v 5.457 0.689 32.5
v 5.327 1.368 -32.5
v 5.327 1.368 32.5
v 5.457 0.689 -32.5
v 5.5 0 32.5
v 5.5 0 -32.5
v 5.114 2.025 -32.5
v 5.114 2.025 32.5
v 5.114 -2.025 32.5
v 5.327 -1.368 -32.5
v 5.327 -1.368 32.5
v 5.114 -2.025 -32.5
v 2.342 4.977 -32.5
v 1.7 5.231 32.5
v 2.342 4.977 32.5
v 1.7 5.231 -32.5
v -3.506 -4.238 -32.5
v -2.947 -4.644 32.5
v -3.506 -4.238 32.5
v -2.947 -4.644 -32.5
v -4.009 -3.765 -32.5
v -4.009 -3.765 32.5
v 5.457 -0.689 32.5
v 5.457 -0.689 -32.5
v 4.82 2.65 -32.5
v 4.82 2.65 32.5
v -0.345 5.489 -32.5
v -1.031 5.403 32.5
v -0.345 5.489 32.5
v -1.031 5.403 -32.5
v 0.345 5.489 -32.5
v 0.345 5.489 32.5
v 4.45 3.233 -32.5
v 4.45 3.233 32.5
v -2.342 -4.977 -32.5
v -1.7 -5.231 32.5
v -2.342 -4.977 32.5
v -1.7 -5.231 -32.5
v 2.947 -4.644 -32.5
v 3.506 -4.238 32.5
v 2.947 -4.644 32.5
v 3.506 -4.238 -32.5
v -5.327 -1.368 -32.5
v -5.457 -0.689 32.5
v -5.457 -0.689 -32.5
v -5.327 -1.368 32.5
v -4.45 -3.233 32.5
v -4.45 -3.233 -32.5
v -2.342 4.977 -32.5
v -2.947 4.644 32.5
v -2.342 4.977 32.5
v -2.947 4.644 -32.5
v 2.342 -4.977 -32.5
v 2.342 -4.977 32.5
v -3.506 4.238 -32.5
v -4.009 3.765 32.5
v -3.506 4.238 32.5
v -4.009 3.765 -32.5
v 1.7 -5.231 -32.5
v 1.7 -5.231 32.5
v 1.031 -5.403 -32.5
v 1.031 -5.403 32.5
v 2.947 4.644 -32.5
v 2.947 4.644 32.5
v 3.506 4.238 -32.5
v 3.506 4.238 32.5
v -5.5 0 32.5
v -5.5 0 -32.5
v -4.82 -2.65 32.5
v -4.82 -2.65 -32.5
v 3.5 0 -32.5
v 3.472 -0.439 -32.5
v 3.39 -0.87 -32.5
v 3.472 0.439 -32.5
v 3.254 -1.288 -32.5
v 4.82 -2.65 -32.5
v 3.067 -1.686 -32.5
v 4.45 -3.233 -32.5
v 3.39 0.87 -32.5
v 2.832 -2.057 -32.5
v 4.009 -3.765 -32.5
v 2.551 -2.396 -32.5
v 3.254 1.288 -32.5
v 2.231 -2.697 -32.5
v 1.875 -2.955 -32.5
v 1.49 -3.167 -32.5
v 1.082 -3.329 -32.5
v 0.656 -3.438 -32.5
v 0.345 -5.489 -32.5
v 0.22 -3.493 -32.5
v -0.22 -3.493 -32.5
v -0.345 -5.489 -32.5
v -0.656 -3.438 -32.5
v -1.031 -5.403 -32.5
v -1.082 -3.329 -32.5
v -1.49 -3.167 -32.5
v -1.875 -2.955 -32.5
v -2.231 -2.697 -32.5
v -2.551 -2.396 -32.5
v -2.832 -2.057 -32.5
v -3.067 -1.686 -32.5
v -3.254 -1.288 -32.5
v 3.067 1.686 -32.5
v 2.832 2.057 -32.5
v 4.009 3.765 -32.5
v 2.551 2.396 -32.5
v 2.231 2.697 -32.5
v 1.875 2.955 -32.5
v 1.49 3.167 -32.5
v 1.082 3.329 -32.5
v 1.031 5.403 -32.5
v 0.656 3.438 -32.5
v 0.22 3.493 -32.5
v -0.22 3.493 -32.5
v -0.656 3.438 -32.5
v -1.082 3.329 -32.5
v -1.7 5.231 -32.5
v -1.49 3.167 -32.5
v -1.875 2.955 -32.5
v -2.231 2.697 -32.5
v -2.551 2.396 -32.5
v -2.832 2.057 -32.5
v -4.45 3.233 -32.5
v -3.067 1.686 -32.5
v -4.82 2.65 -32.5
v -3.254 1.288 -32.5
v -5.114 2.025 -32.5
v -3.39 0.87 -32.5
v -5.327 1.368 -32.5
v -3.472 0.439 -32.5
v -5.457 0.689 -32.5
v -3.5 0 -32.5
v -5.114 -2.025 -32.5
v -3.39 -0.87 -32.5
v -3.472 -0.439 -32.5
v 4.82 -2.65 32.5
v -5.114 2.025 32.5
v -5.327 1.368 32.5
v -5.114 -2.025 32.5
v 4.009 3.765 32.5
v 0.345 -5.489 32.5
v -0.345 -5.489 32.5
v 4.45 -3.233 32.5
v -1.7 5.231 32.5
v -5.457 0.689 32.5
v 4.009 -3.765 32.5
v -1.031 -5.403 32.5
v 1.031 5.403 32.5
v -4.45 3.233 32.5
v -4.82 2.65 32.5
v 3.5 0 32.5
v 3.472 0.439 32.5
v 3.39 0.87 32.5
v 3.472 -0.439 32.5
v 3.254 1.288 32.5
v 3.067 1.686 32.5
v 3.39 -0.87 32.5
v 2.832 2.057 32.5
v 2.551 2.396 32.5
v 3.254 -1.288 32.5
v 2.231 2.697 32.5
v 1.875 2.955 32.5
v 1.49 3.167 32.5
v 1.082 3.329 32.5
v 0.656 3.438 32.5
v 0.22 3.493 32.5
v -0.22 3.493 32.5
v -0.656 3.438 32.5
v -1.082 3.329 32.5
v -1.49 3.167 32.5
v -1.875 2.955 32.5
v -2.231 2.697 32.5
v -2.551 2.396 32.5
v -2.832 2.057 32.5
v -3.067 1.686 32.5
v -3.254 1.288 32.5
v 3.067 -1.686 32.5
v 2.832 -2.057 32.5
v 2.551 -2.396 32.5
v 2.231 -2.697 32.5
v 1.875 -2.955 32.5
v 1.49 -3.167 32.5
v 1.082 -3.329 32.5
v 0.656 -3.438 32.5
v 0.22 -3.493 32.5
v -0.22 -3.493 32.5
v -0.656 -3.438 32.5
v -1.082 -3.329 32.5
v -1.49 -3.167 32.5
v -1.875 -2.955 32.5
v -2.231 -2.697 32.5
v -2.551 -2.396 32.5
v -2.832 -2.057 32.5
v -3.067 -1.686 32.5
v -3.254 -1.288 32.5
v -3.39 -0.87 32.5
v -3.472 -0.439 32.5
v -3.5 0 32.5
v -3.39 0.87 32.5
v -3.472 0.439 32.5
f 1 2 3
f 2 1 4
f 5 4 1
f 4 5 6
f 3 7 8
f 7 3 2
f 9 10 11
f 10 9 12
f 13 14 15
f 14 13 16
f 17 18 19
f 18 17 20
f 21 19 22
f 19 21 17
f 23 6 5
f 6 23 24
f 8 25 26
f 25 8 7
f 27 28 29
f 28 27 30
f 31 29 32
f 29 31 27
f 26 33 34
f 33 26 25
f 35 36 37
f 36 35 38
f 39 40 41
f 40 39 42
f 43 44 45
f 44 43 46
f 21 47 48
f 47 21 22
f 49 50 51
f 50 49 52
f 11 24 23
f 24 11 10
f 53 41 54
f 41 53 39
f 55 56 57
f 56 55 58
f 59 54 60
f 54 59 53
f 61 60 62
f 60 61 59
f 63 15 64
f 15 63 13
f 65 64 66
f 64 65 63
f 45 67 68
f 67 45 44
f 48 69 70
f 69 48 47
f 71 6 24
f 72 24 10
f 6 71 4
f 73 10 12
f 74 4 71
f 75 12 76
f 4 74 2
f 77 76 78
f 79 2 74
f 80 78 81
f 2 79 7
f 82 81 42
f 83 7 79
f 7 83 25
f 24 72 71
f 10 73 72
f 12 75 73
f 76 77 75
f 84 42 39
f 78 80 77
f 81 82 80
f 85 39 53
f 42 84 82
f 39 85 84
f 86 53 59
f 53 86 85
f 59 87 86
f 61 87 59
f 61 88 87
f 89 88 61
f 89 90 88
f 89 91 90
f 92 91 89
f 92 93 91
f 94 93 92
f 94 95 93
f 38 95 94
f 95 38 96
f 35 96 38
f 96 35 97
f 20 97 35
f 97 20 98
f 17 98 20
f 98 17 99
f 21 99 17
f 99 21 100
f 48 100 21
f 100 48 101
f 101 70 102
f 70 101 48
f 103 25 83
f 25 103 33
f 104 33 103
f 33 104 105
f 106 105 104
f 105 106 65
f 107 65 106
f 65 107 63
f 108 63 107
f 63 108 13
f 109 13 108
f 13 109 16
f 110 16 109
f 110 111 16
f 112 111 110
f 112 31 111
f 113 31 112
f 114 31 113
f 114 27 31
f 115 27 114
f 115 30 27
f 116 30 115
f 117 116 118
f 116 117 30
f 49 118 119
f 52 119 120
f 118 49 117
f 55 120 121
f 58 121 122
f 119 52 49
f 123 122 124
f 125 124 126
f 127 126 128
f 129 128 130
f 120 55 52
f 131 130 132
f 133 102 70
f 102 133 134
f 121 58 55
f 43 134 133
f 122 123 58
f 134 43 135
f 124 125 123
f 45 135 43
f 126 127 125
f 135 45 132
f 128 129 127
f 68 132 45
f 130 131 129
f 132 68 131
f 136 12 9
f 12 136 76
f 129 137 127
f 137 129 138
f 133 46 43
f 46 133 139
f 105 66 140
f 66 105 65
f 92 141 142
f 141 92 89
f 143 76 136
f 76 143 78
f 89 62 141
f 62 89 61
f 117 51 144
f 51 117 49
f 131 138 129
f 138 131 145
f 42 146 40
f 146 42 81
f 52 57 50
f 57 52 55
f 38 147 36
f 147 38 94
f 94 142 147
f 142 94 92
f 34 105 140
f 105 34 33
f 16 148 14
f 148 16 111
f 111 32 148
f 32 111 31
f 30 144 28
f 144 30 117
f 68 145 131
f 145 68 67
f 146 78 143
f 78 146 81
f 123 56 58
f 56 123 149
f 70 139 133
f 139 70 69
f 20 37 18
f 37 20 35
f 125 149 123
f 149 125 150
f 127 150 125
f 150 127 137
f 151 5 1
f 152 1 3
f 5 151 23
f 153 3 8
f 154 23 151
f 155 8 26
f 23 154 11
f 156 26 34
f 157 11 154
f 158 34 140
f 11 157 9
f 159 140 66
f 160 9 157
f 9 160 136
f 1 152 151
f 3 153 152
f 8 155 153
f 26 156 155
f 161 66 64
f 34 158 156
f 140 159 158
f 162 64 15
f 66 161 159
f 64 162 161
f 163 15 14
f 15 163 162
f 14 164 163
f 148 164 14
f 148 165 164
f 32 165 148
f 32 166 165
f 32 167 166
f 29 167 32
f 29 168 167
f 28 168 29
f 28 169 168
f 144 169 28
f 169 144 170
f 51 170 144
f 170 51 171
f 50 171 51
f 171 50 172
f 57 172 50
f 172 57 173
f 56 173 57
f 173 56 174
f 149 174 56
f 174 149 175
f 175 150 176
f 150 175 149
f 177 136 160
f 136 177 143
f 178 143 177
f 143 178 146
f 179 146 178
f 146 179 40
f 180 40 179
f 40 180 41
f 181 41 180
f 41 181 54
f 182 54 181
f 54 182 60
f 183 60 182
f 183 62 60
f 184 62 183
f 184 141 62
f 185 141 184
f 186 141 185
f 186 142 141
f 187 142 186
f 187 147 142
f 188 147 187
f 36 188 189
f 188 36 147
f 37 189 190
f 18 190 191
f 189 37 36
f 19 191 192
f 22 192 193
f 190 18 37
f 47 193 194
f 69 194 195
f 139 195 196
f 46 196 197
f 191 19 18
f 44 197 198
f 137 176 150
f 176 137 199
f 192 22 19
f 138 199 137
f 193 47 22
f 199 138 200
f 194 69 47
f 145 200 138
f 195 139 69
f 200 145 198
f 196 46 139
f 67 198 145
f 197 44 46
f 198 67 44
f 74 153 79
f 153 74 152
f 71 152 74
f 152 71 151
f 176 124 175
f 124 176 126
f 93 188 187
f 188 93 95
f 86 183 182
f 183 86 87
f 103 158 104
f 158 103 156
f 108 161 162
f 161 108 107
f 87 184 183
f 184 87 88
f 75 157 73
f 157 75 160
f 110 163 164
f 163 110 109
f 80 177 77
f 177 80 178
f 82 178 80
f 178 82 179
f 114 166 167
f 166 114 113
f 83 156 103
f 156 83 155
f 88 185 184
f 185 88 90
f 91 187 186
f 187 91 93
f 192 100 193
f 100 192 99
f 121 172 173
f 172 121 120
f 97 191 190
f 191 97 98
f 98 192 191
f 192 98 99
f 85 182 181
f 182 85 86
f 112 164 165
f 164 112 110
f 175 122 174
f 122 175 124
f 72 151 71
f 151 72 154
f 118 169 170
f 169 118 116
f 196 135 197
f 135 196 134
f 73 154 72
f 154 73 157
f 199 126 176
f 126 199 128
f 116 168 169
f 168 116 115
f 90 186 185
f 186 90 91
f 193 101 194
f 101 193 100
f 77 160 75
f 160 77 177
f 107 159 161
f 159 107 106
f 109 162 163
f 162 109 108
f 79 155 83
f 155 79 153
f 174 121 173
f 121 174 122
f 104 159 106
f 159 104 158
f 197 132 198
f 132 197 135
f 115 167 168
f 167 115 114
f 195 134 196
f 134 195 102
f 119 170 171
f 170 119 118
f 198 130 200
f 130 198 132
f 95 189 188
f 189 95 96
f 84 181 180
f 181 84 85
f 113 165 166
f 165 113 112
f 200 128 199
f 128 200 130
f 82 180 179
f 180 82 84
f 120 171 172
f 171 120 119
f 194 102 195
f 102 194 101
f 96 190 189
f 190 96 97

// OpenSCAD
$fn = 50;


difference() {
	union() {
		translate(v = [0, 0, -32.5000000000]) {
			cylinder(h = 65, r = 5.5000000000);
		}
	}
	union() {
		translate(v = [0, 0, -100.0000000000]) {
			cylinder(h = 200, r = 3.5000000000);
		}
	}
}
